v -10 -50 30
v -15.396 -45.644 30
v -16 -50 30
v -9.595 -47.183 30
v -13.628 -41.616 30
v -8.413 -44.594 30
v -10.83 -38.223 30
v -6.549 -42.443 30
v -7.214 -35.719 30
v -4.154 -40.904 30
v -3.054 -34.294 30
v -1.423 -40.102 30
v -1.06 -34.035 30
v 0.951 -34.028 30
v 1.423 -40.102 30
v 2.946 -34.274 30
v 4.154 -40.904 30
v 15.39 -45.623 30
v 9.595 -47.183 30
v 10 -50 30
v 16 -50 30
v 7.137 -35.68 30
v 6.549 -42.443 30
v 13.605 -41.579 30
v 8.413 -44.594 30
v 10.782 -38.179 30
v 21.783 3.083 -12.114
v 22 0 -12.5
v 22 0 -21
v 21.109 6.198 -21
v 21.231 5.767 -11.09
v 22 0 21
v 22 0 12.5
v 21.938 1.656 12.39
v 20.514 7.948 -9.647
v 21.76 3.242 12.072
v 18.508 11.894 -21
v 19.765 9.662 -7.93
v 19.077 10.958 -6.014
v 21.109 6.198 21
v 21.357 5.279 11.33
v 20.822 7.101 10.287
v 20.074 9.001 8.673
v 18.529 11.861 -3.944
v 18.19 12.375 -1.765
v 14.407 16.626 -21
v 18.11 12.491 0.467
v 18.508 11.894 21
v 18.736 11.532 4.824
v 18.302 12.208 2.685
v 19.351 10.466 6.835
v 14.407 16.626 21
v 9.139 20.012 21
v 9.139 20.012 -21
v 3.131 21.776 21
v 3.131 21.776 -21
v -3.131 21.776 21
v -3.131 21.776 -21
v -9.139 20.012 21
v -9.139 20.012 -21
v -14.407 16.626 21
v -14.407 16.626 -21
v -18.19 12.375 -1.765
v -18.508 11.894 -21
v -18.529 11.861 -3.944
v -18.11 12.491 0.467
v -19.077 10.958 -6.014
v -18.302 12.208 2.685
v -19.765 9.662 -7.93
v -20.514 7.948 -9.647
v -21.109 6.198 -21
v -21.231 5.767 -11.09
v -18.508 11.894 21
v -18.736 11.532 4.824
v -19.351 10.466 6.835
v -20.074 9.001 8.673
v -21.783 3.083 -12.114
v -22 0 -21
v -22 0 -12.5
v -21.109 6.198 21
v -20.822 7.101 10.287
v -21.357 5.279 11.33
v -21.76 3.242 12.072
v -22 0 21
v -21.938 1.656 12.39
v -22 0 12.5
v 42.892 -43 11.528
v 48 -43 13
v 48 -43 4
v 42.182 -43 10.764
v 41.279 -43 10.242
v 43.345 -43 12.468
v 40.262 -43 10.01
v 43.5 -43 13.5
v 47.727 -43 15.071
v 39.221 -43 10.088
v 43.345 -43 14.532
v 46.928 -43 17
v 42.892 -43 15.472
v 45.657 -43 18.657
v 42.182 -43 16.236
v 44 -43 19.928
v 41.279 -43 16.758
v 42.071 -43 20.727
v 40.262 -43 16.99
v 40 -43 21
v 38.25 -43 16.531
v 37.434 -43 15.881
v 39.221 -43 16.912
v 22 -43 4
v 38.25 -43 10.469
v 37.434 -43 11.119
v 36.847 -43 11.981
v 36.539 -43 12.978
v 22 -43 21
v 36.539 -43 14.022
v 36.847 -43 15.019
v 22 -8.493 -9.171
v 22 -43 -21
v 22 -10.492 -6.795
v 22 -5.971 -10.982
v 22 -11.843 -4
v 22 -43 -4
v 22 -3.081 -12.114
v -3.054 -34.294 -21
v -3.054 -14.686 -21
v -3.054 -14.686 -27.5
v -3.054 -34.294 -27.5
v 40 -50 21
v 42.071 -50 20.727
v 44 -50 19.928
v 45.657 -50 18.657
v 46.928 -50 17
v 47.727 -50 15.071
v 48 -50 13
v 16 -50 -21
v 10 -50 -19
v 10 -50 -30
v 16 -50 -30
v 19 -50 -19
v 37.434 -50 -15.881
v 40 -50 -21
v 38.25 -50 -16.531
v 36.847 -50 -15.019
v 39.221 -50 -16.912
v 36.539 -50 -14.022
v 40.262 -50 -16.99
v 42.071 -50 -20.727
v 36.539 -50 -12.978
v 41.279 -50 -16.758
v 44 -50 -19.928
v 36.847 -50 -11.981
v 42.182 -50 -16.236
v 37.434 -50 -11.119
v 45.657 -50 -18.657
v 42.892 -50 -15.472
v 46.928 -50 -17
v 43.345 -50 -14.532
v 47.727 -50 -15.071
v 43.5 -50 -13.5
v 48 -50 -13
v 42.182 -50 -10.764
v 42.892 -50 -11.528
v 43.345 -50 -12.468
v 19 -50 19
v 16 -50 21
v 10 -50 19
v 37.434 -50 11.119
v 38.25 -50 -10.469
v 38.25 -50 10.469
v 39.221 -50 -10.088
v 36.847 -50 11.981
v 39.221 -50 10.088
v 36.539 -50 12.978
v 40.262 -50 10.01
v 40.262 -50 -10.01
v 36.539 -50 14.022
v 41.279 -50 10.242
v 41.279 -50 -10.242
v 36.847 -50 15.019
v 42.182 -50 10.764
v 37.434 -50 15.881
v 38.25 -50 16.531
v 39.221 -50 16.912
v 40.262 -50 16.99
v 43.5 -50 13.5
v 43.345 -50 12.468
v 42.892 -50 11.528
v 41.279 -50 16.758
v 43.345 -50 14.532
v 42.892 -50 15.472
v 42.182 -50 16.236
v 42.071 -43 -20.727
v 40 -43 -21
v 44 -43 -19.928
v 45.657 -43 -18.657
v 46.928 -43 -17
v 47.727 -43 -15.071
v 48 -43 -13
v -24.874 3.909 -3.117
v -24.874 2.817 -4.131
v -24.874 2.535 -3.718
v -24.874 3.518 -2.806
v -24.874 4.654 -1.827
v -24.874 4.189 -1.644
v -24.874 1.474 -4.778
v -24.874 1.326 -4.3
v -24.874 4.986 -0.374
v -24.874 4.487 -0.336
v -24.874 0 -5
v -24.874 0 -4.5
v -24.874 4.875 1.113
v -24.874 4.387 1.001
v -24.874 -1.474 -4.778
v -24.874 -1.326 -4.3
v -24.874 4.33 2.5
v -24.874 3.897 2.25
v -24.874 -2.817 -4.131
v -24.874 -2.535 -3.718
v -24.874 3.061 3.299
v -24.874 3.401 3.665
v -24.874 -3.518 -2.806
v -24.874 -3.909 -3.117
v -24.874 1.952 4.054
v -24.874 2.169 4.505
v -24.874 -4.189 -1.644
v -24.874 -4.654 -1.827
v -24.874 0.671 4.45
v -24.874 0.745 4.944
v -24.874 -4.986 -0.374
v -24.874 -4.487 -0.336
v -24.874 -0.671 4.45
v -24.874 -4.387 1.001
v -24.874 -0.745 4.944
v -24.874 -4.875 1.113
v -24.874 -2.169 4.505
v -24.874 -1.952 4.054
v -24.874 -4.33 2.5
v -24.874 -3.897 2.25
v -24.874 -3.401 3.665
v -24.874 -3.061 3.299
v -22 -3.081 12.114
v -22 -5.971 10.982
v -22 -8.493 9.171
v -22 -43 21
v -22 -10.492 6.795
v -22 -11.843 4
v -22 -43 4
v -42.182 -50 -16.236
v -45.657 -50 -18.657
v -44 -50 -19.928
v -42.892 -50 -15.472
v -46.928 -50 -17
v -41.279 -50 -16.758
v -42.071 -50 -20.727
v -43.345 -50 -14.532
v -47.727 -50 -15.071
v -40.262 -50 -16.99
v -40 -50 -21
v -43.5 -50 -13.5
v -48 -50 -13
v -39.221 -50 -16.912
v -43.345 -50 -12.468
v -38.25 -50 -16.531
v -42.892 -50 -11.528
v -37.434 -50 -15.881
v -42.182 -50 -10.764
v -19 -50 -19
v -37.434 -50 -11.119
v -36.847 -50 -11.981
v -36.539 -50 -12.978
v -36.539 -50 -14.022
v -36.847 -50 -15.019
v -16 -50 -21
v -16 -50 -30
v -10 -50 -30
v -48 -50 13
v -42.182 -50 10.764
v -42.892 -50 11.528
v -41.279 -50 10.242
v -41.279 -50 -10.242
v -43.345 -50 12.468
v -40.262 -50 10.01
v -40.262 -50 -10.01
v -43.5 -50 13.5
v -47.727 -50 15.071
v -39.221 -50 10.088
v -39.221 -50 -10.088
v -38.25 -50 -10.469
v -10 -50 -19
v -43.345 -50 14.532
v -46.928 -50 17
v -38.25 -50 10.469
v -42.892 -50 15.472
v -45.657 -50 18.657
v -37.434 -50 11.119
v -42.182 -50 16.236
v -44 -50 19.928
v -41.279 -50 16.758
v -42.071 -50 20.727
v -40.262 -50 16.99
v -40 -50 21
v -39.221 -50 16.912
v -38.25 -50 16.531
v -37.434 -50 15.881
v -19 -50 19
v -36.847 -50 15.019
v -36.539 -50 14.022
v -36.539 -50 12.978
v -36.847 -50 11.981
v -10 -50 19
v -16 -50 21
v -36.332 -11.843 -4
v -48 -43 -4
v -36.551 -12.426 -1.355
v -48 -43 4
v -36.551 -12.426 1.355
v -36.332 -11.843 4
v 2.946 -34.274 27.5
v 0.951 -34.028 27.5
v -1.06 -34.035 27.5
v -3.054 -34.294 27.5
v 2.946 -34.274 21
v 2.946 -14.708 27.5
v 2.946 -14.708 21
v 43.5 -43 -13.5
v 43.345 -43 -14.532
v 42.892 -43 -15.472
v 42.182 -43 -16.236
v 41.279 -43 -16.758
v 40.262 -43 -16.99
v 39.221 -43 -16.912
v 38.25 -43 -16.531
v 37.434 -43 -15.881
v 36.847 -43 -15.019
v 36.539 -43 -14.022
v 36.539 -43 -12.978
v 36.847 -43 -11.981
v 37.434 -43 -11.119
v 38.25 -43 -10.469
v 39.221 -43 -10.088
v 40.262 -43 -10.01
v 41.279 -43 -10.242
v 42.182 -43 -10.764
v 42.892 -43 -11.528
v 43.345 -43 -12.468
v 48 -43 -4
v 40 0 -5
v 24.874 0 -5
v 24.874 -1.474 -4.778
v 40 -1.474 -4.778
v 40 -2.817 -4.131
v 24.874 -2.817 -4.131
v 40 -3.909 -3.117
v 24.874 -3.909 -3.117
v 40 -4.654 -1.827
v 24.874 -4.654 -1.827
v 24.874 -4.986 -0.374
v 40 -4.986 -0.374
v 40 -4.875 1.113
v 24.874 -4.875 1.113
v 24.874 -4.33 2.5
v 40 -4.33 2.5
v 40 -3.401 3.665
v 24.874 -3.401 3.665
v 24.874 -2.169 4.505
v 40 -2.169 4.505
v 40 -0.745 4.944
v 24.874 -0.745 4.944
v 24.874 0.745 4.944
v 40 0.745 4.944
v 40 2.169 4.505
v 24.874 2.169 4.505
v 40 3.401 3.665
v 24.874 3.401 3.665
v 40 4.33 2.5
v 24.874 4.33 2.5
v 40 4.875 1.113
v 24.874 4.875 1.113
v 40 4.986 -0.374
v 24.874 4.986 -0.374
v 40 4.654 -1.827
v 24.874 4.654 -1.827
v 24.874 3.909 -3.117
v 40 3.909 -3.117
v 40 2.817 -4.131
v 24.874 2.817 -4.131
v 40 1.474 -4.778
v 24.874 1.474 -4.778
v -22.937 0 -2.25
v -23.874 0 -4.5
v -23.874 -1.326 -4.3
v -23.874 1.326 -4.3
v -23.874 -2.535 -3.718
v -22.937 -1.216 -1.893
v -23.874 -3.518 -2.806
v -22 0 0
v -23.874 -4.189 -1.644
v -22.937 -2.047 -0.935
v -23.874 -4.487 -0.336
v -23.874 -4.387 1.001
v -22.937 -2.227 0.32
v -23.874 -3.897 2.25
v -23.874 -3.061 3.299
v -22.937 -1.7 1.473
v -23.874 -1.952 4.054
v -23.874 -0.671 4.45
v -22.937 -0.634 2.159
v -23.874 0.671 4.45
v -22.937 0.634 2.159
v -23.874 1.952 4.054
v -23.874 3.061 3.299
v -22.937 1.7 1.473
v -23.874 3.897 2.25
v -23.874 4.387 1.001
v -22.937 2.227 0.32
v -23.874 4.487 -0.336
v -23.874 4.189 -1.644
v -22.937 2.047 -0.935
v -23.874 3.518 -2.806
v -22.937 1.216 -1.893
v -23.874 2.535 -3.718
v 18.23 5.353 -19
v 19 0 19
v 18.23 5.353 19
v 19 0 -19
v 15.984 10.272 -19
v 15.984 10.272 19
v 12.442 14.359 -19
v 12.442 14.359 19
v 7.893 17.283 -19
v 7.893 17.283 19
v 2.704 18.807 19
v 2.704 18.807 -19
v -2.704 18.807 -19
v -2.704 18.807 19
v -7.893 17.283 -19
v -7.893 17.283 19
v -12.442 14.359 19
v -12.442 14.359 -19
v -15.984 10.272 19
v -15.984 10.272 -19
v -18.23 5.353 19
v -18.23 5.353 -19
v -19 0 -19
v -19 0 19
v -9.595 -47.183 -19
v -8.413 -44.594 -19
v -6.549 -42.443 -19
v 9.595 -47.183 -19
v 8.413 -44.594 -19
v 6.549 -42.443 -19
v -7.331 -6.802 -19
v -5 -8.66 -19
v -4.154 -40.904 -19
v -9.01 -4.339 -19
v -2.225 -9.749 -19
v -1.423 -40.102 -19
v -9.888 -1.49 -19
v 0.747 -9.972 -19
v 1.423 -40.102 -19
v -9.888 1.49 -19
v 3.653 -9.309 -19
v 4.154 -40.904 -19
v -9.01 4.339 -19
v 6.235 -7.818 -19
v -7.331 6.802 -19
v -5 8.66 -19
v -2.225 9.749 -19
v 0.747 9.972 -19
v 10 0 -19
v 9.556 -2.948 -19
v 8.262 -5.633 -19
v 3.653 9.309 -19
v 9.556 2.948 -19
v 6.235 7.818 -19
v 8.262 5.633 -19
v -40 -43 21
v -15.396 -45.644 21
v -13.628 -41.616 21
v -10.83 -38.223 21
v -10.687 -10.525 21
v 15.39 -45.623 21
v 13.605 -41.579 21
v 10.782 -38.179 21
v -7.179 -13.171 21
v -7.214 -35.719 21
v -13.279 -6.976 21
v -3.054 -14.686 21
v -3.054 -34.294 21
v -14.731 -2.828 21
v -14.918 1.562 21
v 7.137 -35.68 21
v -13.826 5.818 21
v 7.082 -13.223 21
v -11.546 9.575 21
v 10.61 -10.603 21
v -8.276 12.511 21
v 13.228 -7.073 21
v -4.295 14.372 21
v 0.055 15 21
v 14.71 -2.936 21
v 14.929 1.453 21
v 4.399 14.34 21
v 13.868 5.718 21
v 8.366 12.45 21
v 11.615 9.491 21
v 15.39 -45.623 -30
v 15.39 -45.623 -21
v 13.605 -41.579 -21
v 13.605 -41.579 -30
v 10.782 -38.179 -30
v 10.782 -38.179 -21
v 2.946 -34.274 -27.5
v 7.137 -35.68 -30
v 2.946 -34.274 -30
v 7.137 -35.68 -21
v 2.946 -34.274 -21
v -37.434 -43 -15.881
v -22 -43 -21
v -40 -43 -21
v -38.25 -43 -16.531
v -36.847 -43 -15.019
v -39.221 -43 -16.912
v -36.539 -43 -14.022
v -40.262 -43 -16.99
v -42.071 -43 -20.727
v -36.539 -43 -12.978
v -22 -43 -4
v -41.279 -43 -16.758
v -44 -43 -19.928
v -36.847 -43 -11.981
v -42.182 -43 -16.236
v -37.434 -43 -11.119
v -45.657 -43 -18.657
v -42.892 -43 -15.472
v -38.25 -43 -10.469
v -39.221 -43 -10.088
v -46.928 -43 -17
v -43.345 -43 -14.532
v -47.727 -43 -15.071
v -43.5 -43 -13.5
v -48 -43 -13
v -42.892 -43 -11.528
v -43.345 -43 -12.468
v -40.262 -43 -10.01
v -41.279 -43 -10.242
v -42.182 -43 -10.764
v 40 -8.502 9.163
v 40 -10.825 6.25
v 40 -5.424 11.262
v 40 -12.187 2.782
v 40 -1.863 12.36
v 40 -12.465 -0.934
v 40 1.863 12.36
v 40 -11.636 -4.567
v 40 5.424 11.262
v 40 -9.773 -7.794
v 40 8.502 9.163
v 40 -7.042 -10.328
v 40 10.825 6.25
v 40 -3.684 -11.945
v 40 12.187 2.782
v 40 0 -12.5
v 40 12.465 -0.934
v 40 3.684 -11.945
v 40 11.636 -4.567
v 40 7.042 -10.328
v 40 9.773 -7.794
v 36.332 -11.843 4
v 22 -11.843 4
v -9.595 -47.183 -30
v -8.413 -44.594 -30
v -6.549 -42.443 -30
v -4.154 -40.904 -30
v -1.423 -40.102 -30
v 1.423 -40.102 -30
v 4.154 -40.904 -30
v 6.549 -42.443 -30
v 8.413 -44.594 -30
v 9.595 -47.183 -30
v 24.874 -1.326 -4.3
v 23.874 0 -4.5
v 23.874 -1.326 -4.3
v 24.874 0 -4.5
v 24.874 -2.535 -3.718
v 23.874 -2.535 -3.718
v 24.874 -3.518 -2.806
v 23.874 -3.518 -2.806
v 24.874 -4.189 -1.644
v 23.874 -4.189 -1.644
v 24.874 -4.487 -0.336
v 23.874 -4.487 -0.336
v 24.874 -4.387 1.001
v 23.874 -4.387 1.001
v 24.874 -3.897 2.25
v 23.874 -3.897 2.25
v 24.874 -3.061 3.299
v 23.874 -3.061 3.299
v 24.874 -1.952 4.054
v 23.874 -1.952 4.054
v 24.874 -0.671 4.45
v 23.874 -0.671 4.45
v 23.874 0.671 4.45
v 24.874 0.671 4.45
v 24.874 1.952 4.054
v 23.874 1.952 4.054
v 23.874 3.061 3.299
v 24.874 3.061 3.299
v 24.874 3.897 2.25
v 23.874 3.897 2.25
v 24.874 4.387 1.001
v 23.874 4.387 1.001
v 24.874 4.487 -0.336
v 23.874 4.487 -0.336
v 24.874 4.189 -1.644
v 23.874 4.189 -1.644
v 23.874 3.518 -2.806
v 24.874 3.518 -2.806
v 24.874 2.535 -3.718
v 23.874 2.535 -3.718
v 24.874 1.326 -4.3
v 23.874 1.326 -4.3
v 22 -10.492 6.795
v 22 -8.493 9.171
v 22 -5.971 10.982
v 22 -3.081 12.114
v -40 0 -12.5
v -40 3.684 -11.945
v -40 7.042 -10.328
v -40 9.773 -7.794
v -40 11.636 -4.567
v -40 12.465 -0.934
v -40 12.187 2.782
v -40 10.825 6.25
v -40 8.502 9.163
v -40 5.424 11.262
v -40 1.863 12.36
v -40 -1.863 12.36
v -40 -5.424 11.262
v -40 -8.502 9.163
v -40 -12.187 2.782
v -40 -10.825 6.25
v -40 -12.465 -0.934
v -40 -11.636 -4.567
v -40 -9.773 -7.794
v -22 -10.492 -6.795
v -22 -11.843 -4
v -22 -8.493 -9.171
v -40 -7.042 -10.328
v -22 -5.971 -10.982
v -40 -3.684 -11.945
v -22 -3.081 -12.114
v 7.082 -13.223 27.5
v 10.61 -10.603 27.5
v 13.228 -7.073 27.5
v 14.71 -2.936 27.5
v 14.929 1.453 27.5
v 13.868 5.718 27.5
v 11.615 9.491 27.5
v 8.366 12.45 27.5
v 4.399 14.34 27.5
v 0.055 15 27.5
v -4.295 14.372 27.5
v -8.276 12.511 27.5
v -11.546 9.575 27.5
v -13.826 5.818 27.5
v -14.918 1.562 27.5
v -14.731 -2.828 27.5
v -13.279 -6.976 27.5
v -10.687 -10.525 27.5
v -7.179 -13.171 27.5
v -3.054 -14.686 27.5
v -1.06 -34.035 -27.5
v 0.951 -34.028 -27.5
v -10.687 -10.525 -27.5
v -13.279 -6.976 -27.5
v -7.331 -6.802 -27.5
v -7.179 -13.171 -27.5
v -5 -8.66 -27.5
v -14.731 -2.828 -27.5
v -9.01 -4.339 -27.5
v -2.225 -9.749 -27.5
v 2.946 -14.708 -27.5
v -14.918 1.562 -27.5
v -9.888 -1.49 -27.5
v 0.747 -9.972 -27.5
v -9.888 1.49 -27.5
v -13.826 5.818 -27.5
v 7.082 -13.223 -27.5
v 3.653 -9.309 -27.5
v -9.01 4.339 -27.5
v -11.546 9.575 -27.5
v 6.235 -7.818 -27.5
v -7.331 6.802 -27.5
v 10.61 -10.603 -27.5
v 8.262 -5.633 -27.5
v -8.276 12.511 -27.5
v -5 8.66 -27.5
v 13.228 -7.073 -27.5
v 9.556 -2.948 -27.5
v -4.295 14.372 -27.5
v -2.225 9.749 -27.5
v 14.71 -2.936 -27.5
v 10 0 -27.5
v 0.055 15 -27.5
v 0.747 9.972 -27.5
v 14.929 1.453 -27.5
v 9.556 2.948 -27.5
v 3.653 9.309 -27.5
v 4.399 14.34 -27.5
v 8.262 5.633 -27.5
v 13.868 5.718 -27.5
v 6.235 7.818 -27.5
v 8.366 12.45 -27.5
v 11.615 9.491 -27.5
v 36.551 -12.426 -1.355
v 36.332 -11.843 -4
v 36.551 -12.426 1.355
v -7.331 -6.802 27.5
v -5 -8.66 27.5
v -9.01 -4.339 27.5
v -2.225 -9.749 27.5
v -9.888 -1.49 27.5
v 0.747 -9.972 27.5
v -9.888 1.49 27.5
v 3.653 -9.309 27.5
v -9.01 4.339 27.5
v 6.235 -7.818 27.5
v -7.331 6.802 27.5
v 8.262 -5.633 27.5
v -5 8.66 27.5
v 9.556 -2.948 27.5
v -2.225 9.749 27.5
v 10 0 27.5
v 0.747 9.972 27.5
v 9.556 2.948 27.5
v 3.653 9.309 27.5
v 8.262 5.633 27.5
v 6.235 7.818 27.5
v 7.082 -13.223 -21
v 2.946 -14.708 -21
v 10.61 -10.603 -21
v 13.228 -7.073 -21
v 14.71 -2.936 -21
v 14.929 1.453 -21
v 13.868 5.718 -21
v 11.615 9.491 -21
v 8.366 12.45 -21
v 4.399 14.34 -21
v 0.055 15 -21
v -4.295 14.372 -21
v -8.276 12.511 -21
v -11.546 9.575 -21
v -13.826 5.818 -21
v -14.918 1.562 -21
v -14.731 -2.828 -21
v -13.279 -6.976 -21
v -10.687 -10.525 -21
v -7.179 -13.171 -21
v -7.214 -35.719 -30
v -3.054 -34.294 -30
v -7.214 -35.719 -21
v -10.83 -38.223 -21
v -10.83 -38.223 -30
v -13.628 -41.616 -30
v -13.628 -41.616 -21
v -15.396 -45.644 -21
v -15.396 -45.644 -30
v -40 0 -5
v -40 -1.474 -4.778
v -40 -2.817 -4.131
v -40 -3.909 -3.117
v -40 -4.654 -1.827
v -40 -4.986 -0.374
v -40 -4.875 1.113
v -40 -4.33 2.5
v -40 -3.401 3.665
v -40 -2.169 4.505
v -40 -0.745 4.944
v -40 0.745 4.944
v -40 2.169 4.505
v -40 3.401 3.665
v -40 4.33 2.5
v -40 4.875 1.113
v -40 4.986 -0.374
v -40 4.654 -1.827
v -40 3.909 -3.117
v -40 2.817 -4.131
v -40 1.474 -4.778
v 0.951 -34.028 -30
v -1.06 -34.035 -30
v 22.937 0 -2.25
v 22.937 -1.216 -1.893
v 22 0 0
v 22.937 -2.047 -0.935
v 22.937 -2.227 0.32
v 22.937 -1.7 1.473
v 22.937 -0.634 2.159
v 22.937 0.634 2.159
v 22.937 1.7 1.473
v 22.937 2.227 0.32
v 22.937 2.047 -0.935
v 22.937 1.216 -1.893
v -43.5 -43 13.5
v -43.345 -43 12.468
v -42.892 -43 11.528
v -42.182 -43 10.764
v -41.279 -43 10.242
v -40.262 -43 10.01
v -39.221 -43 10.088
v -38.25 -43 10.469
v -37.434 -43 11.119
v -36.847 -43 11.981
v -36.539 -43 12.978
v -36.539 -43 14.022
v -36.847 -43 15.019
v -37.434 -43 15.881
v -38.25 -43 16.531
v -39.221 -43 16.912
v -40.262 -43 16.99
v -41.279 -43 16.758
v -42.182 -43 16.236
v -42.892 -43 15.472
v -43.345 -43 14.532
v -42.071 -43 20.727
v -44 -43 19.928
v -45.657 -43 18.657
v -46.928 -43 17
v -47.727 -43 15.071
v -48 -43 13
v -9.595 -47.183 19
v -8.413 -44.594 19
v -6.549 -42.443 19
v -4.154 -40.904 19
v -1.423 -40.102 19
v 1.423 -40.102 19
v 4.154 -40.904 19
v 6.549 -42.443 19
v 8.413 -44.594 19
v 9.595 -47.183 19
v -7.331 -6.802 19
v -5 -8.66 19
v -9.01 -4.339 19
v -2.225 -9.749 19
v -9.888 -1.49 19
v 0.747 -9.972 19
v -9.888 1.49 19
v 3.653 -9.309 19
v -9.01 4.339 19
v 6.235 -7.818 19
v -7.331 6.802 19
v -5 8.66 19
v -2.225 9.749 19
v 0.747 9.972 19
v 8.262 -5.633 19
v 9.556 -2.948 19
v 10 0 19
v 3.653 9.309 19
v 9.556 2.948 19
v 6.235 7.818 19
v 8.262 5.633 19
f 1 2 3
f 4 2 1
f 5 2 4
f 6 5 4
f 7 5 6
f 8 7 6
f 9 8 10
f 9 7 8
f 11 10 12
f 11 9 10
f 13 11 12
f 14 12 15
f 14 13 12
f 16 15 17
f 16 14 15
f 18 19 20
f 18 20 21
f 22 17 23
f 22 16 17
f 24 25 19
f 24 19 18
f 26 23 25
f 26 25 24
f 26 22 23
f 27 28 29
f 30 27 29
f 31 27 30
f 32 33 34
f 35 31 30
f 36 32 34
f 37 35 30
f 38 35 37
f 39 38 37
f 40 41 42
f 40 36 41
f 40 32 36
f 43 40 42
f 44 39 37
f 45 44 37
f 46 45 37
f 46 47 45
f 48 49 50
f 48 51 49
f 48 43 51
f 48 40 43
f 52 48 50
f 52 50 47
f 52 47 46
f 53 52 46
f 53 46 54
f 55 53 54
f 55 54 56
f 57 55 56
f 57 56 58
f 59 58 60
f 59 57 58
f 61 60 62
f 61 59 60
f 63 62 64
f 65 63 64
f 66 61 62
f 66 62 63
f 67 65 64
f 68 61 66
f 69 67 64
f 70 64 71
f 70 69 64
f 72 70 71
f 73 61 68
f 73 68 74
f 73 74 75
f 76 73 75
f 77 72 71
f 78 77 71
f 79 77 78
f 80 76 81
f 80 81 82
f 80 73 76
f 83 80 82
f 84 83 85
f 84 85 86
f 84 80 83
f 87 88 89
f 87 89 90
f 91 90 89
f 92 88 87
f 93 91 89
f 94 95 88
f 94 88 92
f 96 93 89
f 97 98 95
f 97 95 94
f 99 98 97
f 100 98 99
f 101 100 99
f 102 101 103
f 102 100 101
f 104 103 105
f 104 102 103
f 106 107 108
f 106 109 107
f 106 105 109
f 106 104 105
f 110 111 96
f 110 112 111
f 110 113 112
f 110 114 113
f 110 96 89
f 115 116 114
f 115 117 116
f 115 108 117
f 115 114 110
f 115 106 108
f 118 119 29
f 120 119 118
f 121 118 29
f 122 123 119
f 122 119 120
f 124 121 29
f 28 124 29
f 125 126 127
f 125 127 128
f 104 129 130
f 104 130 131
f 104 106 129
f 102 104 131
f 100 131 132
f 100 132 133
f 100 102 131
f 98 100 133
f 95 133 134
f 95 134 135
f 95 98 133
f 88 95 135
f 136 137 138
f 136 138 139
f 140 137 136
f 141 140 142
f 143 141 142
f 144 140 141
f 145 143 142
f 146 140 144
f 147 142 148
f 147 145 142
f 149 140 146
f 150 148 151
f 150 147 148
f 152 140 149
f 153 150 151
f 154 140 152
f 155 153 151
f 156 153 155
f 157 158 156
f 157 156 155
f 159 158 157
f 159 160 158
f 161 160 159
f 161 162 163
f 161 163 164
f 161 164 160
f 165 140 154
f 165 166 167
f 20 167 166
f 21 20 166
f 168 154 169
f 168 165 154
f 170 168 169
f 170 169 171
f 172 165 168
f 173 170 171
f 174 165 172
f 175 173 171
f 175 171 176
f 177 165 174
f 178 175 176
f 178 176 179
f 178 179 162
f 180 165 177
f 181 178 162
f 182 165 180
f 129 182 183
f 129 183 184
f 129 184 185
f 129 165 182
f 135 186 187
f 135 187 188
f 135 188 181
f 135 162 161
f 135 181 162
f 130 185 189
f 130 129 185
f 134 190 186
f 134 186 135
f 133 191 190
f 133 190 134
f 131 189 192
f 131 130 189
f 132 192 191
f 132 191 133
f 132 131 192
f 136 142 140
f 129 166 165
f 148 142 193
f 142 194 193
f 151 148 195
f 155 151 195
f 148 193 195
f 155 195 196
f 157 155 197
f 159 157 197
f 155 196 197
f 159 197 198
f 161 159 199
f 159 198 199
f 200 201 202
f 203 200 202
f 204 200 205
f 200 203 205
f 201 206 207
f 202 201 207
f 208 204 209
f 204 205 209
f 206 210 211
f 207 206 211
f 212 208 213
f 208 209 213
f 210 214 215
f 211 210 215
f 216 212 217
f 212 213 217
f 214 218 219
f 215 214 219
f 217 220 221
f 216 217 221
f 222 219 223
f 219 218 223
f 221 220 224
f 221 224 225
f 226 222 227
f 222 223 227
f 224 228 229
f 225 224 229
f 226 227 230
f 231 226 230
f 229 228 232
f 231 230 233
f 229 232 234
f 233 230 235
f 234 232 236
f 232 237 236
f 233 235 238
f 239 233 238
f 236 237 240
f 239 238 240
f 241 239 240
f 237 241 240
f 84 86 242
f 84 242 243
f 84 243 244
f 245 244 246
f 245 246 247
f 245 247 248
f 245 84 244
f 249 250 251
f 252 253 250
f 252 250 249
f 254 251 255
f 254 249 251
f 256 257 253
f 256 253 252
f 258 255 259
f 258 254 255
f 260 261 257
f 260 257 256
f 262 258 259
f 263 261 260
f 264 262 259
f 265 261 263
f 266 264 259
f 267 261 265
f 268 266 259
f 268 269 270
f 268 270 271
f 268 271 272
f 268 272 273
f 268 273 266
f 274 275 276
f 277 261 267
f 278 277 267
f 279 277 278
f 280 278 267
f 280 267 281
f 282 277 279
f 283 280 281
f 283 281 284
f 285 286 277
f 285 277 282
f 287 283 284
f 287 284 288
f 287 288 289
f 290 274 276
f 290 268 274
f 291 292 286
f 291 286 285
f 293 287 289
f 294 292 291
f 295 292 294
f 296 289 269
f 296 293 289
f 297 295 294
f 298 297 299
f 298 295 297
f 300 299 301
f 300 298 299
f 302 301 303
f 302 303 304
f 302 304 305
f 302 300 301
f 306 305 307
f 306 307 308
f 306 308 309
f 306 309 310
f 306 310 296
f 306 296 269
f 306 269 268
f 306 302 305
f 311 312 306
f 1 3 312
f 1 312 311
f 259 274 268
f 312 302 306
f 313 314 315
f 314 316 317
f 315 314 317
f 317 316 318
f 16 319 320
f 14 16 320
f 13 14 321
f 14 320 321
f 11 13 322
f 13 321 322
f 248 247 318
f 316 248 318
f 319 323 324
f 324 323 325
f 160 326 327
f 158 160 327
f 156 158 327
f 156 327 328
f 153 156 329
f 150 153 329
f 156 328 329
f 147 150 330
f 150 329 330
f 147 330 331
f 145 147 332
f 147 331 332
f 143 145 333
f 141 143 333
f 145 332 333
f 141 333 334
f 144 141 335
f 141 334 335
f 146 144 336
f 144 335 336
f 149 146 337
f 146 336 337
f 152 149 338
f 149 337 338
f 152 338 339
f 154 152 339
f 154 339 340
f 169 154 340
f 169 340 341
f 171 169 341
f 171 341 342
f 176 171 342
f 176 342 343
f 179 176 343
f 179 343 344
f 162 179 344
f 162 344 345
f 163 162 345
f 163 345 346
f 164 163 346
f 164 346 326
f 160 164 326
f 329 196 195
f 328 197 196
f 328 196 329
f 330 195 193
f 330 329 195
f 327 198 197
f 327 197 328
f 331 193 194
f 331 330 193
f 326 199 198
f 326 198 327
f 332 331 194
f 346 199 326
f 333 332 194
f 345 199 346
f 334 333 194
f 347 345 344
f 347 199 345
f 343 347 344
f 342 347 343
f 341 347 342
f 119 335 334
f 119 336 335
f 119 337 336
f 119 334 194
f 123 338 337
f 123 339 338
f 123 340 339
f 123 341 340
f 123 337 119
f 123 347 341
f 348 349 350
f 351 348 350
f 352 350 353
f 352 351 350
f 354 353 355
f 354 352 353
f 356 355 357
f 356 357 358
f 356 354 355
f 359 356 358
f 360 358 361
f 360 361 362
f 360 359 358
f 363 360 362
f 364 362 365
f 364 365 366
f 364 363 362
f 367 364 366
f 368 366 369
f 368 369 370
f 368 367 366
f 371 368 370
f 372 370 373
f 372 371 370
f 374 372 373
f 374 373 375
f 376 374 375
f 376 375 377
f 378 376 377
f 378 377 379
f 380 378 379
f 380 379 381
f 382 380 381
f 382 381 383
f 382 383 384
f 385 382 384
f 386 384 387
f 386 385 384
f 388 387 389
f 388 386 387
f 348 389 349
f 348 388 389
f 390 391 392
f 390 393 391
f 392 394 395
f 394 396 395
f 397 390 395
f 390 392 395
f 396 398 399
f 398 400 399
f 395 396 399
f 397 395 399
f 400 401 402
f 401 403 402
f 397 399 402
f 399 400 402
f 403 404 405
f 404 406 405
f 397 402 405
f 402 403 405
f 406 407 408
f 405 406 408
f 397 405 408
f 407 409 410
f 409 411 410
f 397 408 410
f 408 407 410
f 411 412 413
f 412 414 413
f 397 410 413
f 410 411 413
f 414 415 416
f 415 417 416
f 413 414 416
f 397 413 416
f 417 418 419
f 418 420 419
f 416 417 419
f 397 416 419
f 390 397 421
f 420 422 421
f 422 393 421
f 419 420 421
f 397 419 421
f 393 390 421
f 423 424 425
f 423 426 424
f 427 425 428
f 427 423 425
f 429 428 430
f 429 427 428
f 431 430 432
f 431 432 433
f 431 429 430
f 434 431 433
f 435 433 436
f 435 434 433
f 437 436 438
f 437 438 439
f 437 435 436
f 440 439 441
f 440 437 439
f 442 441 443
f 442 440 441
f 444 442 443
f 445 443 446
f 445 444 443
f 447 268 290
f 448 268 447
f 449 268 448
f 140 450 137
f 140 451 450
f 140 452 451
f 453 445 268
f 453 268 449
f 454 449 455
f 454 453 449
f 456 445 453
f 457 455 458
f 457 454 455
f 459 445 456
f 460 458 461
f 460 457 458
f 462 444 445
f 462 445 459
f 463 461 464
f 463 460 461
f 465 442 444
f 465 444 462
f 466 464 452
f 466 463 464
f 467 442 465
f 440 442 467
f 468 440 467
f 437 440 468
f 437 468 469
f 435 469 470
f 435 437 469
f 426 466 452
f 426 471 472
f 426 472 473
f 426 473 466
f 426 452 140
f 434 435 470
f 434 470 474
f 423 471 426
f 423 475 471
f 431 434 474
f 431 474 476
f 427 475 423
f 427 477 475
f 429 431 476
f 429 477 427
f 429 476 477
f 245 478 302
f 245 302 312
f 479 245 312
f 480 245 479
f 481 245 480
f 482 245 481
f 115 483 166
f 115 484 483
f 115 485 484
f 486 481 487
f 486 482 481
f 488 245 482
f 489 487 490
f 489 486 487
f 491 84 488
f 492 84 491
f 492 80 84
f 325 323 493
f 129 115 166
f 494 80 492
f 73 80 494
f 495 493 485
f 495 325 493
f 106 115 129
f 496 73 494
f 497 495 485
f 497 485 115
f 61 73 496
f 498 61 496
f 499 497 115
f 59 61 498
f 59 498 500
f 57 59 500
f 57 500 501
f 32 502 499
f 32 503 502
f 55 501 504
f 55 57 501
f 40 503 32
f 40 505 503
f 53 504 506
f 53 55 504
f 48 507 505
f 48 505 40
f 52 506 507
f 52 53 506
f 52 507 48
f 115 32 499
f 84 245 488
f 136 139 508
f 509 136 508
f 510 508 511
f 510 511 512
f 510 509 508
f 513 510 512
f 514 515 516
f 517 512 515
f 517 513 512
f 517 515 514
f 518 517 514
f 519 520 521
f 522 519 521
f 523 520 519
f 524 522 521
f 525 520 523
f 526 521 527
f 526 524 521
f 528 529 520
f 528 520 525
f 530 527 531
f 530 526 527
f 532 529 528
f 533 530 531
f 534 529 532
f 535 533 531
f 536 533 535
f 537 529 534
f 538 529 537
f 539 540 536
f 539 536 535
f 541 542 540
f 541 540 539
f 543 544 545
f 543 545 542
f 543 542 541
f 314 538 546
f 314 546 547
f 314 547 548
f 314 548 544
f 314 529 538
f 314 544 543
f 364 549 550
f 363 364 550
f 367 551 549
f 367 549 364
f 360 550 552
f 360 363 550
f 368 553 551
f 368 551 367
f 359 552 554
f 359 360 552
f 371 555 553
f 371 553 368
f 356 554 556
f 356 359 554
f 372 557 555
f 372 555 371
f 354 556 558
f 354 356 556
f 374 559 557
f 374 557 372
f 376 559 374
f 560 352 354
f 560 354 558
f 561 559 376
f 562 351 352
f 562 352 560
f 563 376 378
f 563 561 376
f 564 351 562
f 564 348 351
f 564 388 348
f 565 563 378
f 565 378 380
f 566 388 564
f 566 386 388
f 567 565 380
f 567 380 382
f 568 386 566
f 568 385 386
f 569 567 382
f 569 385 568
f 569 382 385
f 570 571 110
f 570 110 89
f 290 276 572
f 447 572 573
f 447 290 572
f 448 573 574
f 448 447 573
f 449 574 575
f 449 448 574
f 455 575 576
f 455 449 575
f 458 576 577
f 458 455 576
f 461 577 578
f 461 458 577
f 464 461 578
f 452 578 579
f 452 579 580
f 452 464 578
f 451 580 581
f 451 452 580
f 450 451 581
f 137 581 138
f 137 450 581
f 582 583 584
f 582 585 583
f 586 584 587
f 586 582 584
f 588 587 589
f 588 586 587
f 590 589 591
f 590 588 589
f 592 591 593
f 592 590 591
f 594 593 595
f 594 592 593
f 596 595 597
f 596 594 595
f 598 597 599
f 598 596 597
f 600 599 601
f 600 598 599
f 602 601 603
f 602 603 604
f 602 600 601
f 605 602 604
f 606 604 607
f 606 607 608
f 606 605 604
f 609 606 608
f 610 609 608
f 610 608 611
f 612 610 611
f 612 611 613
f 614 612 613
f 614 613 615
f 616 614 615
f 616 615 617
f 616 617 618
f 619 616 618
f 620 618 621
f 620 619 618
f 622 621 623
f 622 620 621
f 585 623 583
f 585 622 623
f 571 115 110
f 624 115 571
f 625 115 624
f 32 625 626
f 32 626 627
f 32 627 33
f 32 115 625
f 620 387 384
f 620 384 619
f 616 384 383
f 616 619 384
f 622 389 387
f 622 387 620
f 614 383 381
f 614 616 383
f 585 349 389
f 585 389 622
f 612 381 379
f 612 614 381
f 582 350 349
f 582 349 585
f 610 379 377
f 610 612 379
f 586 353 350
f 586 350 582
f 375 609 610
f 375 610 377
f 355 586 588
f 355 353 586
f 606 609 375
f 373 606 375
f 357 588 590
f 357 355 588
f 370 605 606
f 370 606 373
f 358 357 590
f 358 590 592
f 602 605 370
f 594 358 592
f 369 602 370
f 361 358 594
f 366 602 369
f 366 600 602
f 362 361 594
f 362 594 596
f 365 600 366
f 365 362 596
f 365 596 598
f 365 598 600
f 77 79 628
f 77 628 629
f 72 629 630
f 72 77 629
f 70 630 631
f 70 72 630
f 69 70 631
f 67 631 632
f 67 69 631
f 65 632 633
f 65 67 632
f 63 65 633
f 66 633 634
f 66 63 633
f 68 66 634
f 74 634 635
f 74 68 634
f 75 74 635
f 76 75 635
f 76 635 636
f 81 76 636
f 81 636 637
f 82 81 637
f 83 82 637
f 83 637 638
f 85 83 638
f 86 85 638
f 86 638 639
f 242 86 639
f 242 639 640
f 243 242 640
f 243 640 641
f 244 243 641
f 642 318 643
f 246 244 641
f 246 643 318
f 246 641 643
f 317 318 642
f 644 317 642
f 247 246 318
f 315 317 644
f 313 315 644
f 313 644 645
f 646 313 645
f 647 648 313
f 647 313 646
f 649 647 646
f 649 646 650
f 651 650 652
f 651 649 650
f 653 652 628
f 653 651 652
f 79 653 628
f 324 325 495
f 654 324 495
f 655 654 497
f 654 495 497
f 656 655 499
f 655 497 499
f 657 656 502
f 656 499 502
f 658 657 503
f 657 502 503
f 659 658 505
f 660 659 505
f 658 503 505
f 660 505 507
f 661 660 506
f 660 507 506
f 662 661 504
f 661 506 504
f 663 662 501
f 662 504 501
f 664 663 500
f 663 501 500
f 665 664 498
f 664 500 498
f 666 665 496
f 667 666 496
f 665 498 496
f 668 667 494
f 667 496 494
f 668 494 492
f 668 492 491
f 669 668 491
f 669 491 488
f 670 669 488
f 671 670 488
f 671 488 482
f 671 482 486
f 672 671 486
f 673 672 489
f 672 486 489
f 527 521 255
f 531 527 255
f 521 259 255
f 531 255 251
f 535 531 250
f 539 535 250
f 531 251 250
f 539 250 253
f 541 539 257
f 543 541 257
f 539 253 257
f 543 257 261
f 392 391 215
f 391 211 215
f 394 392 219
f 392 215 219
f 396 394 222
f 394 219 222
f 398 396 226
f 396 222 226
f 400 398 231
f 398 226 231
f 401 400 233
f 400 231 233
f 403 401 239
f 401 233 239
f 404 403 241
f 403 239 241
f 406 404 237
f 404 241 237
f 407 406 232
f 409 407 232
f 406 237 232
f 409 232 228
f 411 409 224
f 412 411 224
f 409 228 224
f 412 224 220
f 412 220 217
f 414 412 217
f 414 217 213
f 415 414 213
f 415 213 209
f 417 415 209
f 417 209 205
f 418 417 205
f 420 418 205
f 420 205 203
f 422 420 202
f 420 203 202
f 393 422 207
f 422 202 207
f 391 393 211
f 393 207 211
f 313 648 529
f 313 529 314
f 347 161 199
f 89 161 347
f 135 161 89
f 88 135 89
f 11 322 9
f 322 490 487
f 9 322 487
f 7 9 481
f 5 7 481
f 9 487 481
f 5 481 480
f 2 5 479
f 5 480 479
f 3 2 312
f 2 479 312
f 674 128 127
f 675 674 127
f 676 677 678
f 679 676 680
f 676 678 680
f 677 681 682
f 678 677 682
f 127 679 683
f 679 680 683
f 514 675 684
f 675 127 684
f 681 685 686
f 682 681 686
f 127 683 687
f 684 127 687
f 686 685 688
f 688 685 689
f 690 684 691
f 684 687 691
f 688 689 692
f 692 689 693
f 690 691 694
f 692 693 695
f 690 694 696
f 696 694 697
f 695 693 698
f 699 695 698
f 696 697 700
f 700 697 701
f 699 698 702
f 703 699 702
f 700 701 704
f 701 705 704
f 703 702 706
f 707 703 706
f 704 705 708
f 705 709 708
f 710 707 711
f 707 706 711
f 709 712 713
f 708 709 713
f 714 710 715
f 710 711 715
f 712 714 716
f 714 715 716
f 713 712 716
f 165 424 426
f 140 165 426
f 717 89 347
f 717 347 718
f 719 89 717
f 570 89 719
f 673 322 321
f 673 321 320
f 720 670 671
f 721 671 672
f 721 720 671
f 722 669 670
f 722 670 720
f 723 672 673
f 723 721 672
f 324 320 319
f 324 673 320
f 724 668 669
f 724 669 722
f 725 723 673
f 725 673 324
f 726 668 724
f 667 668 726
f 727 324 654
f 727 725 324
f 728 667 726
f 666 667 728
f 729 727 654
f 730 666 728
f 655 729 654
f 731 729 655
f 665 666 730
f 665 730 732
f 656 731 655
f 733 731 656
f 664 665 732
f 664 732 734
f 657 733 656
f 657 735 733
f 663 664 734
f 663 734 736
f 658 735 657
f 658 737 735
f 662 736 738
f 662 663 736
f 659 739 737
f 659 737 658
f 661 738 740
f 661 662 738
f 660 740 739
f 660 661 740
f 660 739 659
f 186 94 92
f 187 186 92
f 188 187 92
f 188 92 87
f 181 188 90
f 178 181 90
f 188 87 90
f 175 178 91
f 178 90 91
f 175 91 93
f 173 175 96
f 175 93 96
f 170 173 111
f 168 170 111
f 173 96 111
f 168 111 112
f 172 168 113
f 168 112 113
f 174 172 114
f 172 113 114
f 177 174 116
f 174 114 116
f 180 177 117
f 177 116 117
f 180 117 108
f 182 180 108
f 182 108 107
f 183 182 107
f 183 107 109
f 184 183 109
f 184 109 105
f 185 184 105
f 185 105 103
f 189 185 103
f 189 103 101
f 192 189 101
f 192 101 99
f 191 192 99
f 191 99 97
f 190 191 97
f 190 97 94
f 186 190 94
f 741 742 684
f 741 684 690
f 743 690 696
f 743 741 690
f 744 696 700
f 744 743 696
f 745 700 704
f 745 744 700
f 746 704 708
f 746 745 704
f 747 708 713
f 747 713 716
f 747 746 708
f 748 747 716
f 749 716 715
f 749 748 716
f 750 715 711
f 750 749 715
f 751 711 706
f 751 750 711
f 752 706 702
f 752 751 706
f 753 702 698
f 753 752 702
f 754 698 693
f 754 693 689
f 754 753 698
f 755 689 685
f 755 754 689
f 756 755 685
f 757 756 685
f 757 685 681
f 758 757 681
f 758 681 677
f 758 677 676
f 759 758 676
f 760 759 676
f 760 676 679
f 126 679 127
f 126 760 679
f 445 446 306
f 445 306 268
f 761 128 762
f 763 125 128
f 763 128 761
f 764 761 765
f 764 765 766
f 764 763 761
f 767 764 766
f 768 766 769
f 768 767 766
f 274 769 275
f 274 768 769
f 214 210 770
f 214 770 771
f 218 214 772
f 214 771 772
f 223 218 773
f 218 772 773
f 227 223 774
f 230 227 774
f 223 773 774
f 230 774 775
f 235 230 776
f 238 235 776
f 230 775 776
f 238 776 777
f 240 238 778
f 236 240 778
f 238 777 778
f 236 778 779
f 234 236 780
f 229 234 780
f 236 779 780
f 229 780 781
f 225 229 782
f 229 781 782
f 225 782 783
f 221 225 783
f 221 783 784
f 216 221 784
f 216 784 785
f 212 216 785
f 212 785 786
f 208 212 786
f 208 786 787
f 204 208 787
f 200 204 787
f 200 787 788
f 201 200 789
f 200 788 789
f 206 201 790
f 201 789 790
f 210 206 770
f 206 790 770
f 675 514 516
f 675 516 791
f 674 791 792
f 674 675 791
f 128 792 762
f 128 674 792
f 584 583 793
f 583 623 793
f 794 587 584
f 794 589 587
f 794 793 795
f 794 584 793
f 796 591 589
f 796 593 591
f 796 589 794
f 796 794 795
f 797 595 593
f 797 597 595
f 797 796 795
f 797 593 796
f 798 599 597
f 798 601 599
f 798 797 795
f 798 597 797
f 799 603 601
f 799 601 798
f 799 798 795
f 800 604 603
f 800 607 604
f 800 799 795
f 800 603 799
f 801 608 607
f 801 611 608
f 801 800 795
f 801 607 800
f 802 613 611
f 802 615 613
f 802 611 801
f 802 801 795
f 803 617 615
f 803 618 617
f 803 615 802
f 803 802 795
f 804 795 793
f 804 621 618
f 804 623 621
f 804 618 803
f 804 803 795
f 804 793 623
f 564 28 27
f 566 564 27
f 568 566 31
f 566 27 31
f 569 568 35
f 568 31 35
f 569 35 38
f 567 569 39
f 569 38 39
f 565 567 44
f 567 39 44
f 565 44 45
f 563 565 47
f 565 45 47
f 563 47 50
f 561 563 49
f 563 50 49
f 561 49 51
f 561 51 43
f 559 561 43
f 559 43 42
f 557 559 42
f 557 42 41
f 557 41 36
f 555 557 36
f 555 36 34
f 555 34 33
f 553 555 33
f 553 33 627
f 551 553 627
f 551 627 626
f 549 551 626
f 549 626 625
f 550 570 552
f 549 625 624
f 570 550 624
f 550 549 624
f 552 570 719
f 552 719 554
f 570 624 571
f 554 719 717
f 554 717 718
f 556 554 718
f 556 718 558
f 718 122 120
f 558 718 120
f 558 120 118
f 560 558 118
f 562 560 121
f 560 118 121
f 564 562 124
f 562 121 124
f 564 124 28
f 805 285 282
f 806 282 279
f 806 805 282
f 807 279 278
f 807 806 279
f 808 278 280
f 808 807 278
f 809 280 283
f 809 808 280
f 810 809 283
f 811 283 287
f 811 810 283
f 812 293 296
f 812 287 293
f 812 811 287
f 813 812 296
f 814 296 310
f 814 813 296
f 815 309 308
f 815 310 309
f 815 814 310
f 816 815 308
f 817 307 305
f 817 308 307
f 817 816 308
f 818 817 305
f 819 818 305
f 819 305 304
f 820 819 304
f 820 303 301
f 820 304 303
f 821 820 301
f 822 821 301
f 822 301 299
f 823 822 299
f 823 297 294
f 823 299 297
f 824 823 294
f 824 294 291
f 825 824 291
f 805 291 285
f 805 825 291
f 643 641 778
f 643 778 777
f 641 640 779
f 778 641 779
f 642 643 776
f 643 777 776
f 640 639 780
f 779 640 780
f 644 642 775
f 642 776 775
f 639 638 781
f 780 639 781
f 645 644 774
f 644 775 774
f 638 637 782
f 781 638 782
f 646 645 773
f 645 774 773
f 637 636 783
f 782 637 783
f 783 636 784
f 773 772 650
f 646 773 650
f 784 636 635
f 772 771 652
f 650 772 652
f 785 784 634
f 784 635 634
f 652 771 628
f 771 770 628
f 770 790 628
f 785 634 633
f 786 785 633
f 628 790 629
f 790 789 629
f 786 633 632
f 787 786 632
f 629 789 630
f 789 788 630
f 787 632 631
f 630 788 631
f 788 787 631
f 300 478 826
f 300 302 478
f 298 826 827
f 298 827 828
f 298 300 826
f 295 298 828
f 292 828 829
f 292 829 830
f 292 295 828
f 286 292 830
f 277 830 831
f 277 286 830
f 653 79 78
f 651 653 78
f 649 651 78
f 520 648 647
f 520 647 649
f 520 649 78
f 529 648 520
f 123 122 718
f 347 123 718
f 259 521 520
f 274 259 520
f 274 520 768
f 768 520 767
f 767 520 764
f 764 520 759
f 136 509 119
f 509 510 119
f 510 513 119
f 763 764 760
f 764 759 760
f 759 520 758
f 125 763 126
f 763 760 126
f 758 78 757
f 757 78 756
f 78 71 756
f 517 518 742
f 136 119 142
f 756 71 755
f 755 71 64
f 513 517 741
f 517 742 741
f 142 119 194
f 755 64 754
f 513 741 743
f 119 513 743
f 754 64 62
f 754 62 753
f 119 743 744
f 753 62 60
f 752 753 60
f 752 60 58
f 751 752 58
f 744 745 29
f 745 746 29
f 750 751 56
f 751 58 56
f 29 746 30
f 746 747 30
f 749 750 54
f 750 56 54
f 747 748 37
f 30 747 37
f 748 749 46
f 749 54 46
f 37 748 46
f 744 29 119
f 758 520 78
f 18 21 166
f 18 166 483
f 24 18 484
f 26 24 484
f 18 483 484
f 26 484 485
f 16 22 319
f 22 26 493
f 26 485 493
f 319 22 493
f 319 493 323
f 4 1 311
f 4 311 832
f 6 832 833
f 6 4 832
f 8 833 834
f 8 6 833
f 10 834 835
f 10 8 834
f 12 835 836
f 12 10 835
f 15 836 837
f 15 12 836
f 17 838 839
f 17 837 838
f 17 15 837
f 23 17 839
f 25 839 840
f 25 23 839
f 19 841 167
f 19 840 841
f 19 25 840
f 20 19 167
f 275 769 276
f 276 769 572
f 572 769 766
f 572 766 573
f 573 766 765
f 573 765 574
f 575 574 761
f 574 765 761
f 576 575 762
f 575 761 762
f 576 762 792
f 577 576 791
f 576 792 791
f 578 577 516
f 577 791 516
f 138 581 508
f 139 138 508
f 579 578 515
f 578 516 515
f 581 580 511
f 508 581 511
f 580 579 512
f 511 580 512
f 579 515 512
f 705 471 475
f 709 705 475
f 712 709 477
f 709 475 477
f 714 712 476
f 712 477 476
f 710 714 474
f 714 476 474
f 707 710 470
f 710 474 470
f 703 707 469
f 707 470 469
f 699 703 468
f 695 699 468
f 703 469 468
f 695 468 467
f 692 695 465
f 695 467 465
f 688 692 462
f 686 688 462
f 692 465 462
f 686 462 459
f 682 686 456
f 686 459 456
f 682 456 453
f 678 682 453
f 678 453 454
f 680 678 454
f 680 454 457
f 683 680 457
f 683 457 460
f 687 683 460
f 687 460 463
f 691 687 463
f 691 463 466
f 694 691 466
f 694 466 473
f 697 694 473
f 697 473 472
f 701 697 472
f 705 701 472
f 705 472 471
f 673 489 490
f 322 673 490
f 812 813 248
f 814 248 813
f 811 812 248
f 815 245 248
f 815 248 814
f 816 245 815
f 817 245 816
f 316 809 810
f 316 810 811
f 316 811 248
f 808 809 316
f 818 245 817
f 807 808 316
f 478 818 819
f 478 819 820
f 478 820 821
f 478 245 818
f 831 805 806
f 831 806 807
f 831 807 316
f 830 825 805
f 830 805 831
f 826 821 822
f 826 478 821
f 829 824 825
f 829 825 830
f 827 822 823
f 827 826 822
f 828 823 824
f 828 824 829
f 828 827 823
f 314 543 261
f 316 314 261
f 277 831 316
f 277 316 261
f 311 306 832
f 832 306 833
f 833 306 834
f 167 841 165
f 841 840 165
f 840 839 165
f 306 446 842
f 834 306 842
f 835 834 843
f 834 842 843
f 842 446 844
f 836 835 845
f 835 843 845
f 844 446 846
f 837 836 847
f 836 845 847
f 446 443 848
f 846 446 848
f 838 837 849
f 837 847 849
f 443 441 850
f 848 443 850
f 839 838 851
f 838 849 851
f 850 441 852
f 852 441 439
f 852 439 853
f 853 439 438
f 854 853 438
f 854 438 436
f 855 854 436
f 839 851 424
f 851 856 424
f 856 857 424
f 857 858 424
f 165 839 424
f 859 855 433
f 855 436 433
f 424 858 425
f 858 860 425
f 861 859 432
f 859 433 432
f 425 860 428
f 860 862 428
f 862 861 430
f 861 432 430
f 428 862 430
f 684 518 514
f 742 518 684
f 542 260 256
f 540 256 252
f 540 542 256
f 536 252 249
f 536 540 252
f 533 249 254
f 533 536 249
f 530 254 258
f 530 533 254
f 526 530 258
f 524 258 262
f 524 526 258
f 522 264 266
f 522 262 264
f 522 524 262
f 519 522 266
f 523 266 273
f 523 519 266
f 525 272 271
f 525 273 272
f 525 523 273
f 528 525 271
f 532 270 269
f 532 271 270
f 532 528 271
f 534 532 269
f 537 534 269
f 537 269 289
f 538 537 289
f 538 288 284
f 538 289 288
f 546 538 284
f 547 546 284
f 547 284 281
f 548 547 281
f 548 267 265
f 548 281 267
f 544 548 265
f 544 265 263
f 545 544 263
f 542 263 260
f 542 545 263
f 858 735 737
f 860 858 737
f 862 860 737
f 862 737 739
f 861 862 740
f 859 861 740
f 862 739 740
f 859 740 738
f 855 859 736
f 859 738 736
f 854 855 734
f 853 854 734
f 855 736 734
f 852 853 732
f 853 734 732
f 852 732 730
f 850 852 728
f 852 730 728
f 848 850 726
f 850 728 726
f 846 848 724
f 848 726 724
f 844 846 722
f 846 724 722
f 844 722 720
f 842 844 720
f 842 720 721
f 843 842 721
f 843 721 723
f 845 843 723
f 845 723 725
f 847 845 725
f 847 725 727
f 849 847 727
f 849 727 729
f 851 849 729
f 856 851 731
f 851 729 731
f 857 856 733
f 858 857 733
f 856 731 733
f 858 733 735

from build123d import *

# Parameters (mm, degrees)
SKETCH1_R           = 15
SKETCH1_R_2         = 10
BOSS_EXTRUDE1_DEPTH = 21
SKETCH2_R           = 3.5
CUT_EXTRUDE1_DEPTH  = 60
FILLET1_R           = 8
SKETCH5_R           = 10
BOSS_EXTRUDE2_DEPTH = 6.5
BOSS_EXTRUDE3_DEPTH = 9
SKETCH6_R           = 12.5
BOSS_EXTRUDE4_DEPTH = 40
BOSS_EXTRUDE5_DEPTH = 4
SKETCH1_3_R         = 10
CUT_EXTRUDE2_DEPTH  = 21
SKETCH10_W          = 19
SKETCH10_H          = 38
SKETCH11_W          = 38
SKETCH11_H          = 38
CUT_EXTRUDE3_DEPTH  = 51


with BuildPart() as part:
    # Sketch1 → Boss-Extrude1 (new body, symmetric)
    with BuildSketch(Plane.XY):
        with BuildLine():
            ThreePointArc((22, 0), (0, 22), (-22, 0))
            Line((-22, 0), (-22, -43))
            Line((-22, -43), (-48, -43))
            Line((-48, -43), (-48, -50))
            Line((-48, -50), (-16, -50))
            ThreePointArc((-16, -50), (0, -34), (16, -50))
            Line((16, -50), (48, -50))
            Line((48, -50), (48, -43))
            Line((48, -43), (22, -43))
            Line((22, -43), (22, 0))
        make_face()
        Circle(SKETCH1_R, mode=Mode.SUBTRACT)
        with BuildLine():
            ThreePointArc((16, -50), (0, -34), (-16, -50))
            Line((-16, -50), (-10, -50))
            ThreePointArc((-10, -50), (0, -40), (10, -50))
            Line((10, -50), (16, -50))
        make_face()
        Circle(SKETCH1_R)
        Circle(SKETCH1_R_2, mode=Mode.SUBTRACT)
    extrude(amount=BOSS_EXTRUDE1_DEPTH, both=True)

    # Sketch2 → Cut-Extrude1 (cut)
    with BuildSketch(Plane(origin=(0, -43, 0), x_dir=(1, 0, 0), z_dir=(0, 1, 0))):
        with Locations((40, 13.5)):
            Circle(SKETCH2_R)
        with Locations((40, -13.5)):
            Circle(SKETCH2_R)
    cut_extrude1 = extrude(amount=-CUT_EXTRUDE1_DEPTH, mode=Mode.SUBTRACT)

    # Mirror1: Cut-Extrude1 across plane
    add(cut_extrude1.mirror(Plane(origin=(0, 0, 0), x_dir=(0, 0, 1), z_dir=(1, 0, 0))), mode=Mode.SUBTRACT)

    # Fillet1
    fillet1_edges = [part.edges().sort_by_distance(p)[0] for p in [
        (-48, -46.5, -21),
        (48, -46.5, -21),
        (48, -46.5, 21),
        (-48, -46.5, 21),
    ]]
    fillet(fillet1_edges, radius=FILLET1_R)

    # Sketch5 → Boss-Extrude2 (add)
    with BuildSketch(Plane.XY.offset(21)):
        with BuildLine():
            Line((-3.053517872, -14.68591259), (-3.053517872, -34.294076639))
            ThreePointArc((-3.053517872, -34.294076639), (-0.054484182, -34.000092767), (2.946482128, -34.273644953))
            Line((2.946482128, -34.273644953), (2.946482128, -14.707761321))
            ThreePointArc((2.946482128, -14.707761321), (0.054621464, 14.99990055), (-3.053517872, -14.68591259))
        make_face()
        Circle(SKETCH5_R, mode=Mode.SUBTRACT)
    boss_extrude2 = extrude(amount=BOSS_EXTRUDE2_DEPTH)

    # Sketch5<3> → Boss-Extrude3 (add)
    with BuildSketch(Plane.XY.offset(21)):
        with BuildLine():
            ThreePointArc((-3.053517872, -34.294076639), (-12.346179286, -39.822974058), (-16, -50))
            Line((-16, -50), (-10, -50))
            ThreePointArc((-10, -50), (0, -40), (10, -50))
            Line((10, -50), (16, -50))
            ThreePointArc((16, -50), (12.311452271, -39.780991096), (2.946482128, -34.273644953))
            ThreePointArc((2.946482128, -34.273644953), (-0.054484182, -34.000092767), (-3.053517872, -34.294076639))
        make_face()
    boss_extrude3 = extrude(amount=BOSS_EXTRUDE3_DEPTH)

    # Mirror2: Boss-Extrude2, Boss-Extrude3 across plane
    add(boss_extrude2.mirror(Plane.XY))
    add(boss_extrude3.mirror(Plane.XY))

    # Sketch6 → Boss-Extrude4 (add)
    with BuildSketch(Plane(origin=(0, 0, 0), x_dir=(0, 0, -1), z_dir=(1, 0, 0))):
        Circle(SKETCH6_R)
    boss_extrude4 = extrude(amount=BOSS_EXTRUDE4_DEPTH)

    # Sketch7 → Boss-Extrude5 (add, symmetric)
    with BuildSketch(Plane.XY):
        Polygon((22, -43), (48, -43), (36, -10.955283754), (22, -10.955283754), align=None)
    boss_extrude5 = extrude(amount=BOSS_EXTRUDE5_DEPTH, both=True)

    # Sketch1<3> → Cut-Extrude2 (cut, symmetric)
    with BuildSketch(Plane.XY):
        Circle(SKETCH1_3_R)
    cut_extrude2 = extrude(amount=CUT_EXTRUDE2_DEPTH, both=True, mode=Mode.SUBTRACT)

    # Sketch8 → Cut-Revolve1 (revolve, cut)
    with BuildSketch(Plane(origin=(0, 0, 0), x_dir=(1, 0, 0), z_dir=(0, 1, 0))):
        Polygon((40, 0), (22, 0), (23.87378357, 4.5), (24.87378357, 4.5), (24.87378357, 5), (40, 5), align=None)
    cut_revolve1 = revolve(axis=Axis((40, 0, 0), (-1, 0, 0)), mode=Mode.SUBTRACT)

    # Mirror4: Boss-Extrude4, Boss-Extrude5, Cut-Extrude2, Cut-Revolve1 across plane
    add(boss_extrude4.mirror(Plane(origin=(0, 0, 0), x_dir=(0, 0, 1), z_dir=(1, 0, 0))))
    add(boss_extrude5.mirror(Plane(origin=(0, 0, 0), x_dir=(0, 0, 1), z_dir=(1, 0, 0))))
    add(cut_extrude2.mirror(Plane(origin=(0, 0, 0), x_dir=(0, 0, 1), z_dir=(1, 0, 0))), mode=Mode.SUBTRACT)
    add(cut_revolve1.mirror(Plane(origin=(0, 0, 0), x_dir=(0, 0, 1), z_dir=(1, 0, 0))), mode=Mode.SUBTRACT)

    # Sketch10 → Cut-Revolve2 (revolve, cut)
    with BuildSketch(Plane(origin=(0, 0, 0), x_dir=(1, 0, 0), z_dir=(0, 1, 0))):
        with Locations((-9.5, 0)):
            Rectangle(SKETCH10_W, SKETCH10_H)
    revolve(axis=Axis((0, 0, -19), (0, 0, 1)), mode=Mode.SUBTRACT)

    # Sketch11 → Cut-Extrude3 (cut, through all)
    with BuildSketch(Plane(origin=(0, 0, 0), x_dir=(1, 0, 0), z_dir=(0, 1, 0))):
        Rectangle(SKETCH11_W, SKETCH11_H)
    extrude(amount=-CUT_EXTRUDE3_DEPTH, mode=Mode.SUBTRACT)


solid = part.part
